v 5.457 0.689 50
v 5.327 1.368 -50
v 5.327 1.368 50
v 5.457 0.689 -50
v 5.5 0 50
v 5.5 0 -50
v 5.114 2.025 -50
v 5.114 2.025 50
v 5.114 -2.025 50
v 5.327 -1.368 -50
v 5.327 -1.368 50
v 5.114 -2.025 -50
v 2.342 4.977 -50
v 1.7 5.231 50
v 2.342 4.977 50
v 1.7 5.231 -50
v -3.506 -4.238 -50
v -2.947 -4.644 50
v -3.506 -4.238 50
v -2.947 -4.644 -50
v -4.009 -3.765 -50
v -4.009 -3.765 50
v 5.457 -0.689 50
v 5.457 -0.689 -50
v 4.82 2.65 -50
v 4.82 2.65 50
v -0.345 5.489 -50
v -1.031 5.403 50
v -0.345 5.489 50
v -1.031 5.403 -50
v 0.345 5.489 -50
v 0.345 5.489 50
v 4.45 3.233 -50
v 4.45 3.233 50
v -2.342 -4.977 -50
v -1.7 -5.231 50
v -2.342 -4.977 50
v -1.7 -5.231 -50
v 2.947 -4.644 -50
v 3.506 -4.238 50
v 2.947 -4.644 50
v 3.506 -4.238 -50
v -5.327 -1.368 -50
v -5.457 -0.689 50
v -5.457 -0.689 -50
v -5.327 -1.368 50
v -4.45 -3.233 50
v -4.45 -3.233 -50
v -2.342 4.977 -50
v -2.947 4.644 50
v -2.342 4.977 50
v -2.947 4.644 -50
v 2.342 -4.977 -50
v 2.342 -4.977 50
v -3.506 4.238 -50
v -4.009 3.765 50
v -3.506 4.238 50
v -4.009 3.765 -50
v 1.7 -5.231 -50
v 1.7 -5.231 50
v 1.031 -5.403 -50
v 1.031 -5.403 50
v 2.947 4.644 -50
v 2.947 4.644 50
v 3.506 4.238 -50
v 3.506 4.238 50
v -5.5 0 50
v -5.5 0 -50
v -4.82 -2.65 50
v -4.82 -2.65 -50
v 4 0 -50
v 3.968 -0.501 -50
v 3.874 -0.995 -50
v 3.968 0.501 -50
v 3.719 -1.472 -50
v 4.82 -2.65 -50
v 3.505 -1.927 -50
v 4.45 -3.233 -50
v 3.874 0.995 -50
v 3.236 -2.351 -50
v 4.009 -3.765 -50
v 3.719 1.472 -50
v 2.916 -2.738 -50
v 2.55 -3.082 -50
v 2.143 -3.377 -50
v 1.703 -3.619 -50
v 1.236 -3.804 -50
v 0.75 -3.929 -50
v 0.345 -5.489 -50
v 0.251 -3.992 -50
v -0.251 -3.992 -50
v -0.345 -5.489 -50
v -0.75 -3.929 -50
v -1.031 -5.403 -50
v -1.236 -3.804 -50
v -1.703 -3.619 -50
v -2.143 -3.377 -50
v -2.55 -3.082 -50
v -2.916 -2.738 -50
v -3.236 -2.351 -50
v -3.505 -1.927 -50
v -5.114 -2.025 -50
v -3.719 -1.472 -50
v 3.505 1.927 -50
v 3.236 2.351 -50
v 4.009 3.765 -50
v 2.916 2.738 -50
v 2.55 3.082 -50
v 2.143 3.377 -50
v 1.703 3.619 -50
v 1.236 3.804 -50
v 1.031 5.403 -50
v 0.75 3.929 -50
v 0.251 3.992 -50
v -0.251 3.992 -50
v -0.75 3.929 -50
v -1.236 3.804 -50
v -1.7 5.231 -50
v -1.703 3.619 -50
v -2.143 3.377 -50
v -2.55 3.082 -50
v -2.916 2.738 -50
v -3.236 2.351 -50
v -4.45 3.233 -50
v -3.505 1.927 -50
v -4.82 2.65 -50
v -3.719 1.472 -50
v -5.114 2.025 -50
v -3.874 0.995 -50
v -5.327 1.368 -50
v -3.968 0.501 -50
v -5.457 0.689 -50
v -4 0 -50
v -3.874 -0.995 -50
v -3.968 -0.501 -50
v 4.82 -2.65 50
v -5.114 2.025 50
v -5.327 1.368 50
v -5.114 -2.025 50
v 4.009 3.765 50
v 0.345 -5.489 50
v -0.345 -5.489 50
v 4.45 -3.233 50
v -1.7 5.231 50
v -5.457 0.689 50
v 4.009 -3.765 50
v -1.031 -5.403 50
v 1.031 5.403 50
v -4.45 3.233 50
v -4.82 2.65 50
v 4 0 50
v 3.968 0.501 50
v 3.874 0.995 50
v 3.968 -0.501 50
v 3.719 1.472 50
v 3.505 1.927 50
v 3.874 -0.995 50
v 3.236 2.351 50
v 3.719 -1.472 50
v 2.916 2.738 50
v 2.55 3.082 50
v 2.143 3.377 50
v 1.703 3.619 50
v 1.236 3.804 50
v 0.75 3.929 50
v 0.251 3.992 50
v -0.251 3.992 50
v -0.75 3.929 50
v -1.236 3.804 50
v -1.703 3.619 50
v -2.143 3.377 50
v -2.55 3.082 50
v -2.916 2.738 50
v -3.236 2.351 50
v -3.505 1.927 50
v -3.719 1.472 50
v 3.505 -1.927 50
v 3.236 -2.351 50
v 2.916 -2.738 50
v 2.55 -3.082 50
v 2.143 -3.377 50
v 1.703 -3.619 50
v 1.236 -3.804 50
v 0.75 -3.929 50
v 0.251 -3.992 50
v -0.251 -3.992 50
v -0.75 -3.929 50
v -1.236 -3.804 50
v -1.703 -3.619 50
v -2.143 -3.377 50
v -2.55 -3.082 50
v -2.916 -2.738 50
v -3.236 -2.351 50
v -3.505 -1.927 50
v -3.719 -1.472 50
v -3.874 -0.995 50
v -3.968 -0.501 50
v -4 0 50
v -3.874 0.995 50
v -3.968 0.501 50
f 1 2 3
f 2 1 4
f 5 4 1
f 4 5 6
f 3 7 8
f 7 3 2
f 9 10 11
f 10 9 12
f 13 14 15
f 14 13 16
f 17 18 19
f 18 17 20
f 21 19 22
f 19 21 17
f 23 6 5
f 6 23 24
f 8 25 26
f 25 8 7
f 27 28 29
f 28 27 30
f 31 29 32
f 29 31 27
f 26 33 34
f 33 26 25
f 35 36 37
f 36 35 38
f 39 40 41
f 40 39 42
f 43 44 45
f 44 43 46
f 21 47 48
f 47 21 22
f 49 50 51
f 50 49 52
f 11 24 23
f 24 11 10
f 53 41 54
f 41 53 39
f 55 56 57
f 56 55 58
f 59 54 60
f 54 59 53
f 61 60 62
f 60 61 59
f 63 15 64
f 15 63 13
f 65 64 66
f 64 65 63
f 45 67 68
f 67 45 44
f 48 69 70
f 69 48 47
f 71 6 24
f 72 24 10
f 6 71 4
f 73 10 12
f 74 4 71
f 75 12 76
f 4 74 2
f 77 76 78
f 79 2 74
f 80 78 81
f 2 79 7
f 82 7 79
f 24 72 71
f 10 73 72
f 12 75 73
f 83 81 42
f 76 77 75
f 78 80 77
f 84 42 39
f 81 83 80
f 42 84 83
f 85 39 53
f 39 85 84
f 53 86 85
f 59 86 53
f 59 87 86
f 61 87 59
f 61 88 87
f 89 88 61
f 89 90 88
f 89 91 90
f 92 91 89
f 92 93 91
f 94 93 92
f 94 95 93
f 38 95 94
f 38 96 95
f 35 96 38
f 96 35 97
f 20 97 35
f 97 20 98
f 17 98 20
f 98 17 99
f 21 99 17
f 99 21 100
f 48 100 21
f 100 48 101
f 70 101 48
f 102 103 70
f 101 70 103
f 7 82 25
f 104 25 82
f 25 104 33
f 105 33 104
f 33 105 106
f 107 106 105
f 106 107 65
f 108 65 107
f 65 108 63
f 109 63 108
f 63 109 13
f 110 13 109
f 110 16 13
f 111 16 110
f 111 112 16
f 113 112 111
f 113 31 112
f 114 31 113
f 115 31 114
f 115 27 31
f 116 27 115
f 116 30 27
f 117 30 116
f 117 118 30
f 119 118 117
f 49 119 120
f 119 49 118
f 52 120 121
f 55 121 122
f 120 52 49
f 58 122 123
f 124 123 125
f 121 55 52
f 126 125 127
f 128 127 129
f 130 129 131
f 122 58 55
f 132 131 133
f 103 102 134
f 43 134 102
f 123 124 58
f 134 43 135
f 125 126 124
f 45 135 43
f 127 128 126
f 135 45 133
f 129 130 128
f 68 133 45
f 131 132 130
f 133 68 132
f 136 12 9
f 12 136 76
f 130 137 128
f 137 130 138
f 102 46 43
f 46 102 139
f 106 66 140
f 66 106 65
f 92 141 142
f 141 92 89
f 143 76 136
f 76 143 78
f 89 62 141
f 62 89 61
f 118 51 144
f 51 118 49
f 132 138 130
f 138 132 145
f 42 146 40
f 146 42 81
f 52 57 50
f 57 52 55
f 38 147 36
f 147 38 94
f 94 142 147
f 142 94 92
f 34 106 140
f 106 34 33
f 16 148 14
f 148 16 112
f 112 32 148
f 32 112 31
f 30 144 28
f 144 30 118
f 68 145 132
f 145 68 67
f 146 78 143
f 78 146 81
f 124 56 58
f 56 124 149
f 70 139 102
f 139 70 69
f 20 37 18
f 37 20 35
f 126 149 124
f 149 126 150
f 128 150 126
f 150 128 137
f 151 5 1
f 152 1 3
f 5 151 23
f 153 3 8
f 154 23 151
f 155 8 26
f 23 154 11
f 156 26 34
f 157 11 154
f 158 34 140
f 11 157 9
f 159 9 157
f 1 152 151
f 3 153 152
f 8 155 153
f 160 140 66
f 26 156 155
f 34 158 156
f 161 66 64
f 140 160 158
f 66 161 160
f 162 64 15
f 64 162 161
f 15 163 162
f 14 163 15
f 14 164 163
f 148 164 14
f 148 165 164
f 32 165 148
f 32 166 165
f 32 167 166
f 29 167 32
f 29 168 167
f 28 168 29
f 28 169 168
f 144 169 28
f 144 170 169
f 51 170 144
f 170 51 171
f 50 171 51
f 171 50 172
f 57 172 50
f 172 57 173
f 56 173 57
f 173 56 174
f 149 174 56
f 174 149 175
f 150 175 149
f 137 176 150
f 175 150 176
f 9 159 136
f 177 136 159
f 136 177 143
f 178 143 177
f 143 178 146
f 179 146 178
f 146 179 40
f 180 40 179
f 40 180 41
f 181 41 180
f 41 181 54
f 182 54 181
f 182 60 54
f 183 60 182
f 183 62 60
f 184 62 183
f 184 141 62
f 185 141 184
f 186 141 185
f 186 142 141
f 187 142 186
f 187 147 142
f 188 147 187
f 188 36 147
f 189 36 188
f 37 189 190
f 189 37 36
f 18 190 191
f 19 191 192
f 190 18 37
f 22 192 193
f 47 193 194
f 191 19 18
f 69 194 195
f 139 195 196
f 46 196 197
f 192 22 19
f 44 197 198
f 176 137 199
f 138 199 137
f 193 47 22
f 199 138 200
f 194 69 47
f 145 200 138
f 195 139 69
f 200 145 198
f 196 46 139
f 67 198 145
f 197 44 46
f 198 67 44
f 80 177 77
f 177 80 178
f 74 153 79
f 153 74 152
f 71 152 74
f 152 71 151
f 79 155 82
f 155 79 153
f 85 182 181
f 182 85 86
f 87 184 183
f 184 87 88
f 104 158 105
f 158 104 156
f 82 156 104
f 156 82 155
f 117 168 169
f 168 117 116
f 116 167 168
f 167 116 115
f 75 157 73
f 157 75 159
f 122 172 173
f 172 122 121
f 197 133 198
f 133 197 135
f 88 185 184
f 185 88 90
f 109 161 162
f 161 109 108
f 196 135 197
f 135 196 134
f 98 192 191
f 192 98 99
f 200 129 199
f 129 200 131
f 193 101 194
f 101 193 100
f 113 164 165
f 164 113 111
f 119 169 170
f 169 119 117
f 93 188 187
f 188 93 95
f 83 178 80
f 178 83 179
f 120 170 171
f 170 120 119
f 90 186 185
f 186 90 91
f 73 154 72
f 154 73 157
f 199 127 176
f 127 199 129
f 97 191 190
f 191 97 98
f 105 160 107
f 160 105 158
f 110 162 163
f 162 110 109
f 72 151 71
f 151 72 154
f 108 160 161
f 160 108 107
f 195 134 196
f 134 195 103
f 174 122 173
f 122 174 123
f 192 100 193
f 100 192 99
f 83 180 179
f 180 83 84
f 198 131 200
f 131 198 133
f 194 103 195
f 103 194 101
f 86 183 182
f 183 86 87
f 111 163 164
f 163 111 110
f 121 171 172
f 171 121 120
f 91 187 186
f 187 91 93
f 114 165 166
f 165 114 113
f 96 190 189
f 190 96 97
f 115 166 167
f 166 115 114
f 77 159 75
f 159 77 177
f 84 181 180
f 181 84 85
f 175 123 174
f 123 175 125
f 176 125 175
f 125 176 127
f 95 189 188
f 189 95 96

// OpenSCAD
$fn = 50;


difference() {
	union() {
		translate(v = [0, 0, -50.0000000000]) {
			cylinder(h = 100, r = 5.5000000000);
		}
	}
	union() {
		translate(v = [0, 0, -100.0000000000]) {
			cylinder(h = 200, r = 4.0000000000);
		}
	}
}
